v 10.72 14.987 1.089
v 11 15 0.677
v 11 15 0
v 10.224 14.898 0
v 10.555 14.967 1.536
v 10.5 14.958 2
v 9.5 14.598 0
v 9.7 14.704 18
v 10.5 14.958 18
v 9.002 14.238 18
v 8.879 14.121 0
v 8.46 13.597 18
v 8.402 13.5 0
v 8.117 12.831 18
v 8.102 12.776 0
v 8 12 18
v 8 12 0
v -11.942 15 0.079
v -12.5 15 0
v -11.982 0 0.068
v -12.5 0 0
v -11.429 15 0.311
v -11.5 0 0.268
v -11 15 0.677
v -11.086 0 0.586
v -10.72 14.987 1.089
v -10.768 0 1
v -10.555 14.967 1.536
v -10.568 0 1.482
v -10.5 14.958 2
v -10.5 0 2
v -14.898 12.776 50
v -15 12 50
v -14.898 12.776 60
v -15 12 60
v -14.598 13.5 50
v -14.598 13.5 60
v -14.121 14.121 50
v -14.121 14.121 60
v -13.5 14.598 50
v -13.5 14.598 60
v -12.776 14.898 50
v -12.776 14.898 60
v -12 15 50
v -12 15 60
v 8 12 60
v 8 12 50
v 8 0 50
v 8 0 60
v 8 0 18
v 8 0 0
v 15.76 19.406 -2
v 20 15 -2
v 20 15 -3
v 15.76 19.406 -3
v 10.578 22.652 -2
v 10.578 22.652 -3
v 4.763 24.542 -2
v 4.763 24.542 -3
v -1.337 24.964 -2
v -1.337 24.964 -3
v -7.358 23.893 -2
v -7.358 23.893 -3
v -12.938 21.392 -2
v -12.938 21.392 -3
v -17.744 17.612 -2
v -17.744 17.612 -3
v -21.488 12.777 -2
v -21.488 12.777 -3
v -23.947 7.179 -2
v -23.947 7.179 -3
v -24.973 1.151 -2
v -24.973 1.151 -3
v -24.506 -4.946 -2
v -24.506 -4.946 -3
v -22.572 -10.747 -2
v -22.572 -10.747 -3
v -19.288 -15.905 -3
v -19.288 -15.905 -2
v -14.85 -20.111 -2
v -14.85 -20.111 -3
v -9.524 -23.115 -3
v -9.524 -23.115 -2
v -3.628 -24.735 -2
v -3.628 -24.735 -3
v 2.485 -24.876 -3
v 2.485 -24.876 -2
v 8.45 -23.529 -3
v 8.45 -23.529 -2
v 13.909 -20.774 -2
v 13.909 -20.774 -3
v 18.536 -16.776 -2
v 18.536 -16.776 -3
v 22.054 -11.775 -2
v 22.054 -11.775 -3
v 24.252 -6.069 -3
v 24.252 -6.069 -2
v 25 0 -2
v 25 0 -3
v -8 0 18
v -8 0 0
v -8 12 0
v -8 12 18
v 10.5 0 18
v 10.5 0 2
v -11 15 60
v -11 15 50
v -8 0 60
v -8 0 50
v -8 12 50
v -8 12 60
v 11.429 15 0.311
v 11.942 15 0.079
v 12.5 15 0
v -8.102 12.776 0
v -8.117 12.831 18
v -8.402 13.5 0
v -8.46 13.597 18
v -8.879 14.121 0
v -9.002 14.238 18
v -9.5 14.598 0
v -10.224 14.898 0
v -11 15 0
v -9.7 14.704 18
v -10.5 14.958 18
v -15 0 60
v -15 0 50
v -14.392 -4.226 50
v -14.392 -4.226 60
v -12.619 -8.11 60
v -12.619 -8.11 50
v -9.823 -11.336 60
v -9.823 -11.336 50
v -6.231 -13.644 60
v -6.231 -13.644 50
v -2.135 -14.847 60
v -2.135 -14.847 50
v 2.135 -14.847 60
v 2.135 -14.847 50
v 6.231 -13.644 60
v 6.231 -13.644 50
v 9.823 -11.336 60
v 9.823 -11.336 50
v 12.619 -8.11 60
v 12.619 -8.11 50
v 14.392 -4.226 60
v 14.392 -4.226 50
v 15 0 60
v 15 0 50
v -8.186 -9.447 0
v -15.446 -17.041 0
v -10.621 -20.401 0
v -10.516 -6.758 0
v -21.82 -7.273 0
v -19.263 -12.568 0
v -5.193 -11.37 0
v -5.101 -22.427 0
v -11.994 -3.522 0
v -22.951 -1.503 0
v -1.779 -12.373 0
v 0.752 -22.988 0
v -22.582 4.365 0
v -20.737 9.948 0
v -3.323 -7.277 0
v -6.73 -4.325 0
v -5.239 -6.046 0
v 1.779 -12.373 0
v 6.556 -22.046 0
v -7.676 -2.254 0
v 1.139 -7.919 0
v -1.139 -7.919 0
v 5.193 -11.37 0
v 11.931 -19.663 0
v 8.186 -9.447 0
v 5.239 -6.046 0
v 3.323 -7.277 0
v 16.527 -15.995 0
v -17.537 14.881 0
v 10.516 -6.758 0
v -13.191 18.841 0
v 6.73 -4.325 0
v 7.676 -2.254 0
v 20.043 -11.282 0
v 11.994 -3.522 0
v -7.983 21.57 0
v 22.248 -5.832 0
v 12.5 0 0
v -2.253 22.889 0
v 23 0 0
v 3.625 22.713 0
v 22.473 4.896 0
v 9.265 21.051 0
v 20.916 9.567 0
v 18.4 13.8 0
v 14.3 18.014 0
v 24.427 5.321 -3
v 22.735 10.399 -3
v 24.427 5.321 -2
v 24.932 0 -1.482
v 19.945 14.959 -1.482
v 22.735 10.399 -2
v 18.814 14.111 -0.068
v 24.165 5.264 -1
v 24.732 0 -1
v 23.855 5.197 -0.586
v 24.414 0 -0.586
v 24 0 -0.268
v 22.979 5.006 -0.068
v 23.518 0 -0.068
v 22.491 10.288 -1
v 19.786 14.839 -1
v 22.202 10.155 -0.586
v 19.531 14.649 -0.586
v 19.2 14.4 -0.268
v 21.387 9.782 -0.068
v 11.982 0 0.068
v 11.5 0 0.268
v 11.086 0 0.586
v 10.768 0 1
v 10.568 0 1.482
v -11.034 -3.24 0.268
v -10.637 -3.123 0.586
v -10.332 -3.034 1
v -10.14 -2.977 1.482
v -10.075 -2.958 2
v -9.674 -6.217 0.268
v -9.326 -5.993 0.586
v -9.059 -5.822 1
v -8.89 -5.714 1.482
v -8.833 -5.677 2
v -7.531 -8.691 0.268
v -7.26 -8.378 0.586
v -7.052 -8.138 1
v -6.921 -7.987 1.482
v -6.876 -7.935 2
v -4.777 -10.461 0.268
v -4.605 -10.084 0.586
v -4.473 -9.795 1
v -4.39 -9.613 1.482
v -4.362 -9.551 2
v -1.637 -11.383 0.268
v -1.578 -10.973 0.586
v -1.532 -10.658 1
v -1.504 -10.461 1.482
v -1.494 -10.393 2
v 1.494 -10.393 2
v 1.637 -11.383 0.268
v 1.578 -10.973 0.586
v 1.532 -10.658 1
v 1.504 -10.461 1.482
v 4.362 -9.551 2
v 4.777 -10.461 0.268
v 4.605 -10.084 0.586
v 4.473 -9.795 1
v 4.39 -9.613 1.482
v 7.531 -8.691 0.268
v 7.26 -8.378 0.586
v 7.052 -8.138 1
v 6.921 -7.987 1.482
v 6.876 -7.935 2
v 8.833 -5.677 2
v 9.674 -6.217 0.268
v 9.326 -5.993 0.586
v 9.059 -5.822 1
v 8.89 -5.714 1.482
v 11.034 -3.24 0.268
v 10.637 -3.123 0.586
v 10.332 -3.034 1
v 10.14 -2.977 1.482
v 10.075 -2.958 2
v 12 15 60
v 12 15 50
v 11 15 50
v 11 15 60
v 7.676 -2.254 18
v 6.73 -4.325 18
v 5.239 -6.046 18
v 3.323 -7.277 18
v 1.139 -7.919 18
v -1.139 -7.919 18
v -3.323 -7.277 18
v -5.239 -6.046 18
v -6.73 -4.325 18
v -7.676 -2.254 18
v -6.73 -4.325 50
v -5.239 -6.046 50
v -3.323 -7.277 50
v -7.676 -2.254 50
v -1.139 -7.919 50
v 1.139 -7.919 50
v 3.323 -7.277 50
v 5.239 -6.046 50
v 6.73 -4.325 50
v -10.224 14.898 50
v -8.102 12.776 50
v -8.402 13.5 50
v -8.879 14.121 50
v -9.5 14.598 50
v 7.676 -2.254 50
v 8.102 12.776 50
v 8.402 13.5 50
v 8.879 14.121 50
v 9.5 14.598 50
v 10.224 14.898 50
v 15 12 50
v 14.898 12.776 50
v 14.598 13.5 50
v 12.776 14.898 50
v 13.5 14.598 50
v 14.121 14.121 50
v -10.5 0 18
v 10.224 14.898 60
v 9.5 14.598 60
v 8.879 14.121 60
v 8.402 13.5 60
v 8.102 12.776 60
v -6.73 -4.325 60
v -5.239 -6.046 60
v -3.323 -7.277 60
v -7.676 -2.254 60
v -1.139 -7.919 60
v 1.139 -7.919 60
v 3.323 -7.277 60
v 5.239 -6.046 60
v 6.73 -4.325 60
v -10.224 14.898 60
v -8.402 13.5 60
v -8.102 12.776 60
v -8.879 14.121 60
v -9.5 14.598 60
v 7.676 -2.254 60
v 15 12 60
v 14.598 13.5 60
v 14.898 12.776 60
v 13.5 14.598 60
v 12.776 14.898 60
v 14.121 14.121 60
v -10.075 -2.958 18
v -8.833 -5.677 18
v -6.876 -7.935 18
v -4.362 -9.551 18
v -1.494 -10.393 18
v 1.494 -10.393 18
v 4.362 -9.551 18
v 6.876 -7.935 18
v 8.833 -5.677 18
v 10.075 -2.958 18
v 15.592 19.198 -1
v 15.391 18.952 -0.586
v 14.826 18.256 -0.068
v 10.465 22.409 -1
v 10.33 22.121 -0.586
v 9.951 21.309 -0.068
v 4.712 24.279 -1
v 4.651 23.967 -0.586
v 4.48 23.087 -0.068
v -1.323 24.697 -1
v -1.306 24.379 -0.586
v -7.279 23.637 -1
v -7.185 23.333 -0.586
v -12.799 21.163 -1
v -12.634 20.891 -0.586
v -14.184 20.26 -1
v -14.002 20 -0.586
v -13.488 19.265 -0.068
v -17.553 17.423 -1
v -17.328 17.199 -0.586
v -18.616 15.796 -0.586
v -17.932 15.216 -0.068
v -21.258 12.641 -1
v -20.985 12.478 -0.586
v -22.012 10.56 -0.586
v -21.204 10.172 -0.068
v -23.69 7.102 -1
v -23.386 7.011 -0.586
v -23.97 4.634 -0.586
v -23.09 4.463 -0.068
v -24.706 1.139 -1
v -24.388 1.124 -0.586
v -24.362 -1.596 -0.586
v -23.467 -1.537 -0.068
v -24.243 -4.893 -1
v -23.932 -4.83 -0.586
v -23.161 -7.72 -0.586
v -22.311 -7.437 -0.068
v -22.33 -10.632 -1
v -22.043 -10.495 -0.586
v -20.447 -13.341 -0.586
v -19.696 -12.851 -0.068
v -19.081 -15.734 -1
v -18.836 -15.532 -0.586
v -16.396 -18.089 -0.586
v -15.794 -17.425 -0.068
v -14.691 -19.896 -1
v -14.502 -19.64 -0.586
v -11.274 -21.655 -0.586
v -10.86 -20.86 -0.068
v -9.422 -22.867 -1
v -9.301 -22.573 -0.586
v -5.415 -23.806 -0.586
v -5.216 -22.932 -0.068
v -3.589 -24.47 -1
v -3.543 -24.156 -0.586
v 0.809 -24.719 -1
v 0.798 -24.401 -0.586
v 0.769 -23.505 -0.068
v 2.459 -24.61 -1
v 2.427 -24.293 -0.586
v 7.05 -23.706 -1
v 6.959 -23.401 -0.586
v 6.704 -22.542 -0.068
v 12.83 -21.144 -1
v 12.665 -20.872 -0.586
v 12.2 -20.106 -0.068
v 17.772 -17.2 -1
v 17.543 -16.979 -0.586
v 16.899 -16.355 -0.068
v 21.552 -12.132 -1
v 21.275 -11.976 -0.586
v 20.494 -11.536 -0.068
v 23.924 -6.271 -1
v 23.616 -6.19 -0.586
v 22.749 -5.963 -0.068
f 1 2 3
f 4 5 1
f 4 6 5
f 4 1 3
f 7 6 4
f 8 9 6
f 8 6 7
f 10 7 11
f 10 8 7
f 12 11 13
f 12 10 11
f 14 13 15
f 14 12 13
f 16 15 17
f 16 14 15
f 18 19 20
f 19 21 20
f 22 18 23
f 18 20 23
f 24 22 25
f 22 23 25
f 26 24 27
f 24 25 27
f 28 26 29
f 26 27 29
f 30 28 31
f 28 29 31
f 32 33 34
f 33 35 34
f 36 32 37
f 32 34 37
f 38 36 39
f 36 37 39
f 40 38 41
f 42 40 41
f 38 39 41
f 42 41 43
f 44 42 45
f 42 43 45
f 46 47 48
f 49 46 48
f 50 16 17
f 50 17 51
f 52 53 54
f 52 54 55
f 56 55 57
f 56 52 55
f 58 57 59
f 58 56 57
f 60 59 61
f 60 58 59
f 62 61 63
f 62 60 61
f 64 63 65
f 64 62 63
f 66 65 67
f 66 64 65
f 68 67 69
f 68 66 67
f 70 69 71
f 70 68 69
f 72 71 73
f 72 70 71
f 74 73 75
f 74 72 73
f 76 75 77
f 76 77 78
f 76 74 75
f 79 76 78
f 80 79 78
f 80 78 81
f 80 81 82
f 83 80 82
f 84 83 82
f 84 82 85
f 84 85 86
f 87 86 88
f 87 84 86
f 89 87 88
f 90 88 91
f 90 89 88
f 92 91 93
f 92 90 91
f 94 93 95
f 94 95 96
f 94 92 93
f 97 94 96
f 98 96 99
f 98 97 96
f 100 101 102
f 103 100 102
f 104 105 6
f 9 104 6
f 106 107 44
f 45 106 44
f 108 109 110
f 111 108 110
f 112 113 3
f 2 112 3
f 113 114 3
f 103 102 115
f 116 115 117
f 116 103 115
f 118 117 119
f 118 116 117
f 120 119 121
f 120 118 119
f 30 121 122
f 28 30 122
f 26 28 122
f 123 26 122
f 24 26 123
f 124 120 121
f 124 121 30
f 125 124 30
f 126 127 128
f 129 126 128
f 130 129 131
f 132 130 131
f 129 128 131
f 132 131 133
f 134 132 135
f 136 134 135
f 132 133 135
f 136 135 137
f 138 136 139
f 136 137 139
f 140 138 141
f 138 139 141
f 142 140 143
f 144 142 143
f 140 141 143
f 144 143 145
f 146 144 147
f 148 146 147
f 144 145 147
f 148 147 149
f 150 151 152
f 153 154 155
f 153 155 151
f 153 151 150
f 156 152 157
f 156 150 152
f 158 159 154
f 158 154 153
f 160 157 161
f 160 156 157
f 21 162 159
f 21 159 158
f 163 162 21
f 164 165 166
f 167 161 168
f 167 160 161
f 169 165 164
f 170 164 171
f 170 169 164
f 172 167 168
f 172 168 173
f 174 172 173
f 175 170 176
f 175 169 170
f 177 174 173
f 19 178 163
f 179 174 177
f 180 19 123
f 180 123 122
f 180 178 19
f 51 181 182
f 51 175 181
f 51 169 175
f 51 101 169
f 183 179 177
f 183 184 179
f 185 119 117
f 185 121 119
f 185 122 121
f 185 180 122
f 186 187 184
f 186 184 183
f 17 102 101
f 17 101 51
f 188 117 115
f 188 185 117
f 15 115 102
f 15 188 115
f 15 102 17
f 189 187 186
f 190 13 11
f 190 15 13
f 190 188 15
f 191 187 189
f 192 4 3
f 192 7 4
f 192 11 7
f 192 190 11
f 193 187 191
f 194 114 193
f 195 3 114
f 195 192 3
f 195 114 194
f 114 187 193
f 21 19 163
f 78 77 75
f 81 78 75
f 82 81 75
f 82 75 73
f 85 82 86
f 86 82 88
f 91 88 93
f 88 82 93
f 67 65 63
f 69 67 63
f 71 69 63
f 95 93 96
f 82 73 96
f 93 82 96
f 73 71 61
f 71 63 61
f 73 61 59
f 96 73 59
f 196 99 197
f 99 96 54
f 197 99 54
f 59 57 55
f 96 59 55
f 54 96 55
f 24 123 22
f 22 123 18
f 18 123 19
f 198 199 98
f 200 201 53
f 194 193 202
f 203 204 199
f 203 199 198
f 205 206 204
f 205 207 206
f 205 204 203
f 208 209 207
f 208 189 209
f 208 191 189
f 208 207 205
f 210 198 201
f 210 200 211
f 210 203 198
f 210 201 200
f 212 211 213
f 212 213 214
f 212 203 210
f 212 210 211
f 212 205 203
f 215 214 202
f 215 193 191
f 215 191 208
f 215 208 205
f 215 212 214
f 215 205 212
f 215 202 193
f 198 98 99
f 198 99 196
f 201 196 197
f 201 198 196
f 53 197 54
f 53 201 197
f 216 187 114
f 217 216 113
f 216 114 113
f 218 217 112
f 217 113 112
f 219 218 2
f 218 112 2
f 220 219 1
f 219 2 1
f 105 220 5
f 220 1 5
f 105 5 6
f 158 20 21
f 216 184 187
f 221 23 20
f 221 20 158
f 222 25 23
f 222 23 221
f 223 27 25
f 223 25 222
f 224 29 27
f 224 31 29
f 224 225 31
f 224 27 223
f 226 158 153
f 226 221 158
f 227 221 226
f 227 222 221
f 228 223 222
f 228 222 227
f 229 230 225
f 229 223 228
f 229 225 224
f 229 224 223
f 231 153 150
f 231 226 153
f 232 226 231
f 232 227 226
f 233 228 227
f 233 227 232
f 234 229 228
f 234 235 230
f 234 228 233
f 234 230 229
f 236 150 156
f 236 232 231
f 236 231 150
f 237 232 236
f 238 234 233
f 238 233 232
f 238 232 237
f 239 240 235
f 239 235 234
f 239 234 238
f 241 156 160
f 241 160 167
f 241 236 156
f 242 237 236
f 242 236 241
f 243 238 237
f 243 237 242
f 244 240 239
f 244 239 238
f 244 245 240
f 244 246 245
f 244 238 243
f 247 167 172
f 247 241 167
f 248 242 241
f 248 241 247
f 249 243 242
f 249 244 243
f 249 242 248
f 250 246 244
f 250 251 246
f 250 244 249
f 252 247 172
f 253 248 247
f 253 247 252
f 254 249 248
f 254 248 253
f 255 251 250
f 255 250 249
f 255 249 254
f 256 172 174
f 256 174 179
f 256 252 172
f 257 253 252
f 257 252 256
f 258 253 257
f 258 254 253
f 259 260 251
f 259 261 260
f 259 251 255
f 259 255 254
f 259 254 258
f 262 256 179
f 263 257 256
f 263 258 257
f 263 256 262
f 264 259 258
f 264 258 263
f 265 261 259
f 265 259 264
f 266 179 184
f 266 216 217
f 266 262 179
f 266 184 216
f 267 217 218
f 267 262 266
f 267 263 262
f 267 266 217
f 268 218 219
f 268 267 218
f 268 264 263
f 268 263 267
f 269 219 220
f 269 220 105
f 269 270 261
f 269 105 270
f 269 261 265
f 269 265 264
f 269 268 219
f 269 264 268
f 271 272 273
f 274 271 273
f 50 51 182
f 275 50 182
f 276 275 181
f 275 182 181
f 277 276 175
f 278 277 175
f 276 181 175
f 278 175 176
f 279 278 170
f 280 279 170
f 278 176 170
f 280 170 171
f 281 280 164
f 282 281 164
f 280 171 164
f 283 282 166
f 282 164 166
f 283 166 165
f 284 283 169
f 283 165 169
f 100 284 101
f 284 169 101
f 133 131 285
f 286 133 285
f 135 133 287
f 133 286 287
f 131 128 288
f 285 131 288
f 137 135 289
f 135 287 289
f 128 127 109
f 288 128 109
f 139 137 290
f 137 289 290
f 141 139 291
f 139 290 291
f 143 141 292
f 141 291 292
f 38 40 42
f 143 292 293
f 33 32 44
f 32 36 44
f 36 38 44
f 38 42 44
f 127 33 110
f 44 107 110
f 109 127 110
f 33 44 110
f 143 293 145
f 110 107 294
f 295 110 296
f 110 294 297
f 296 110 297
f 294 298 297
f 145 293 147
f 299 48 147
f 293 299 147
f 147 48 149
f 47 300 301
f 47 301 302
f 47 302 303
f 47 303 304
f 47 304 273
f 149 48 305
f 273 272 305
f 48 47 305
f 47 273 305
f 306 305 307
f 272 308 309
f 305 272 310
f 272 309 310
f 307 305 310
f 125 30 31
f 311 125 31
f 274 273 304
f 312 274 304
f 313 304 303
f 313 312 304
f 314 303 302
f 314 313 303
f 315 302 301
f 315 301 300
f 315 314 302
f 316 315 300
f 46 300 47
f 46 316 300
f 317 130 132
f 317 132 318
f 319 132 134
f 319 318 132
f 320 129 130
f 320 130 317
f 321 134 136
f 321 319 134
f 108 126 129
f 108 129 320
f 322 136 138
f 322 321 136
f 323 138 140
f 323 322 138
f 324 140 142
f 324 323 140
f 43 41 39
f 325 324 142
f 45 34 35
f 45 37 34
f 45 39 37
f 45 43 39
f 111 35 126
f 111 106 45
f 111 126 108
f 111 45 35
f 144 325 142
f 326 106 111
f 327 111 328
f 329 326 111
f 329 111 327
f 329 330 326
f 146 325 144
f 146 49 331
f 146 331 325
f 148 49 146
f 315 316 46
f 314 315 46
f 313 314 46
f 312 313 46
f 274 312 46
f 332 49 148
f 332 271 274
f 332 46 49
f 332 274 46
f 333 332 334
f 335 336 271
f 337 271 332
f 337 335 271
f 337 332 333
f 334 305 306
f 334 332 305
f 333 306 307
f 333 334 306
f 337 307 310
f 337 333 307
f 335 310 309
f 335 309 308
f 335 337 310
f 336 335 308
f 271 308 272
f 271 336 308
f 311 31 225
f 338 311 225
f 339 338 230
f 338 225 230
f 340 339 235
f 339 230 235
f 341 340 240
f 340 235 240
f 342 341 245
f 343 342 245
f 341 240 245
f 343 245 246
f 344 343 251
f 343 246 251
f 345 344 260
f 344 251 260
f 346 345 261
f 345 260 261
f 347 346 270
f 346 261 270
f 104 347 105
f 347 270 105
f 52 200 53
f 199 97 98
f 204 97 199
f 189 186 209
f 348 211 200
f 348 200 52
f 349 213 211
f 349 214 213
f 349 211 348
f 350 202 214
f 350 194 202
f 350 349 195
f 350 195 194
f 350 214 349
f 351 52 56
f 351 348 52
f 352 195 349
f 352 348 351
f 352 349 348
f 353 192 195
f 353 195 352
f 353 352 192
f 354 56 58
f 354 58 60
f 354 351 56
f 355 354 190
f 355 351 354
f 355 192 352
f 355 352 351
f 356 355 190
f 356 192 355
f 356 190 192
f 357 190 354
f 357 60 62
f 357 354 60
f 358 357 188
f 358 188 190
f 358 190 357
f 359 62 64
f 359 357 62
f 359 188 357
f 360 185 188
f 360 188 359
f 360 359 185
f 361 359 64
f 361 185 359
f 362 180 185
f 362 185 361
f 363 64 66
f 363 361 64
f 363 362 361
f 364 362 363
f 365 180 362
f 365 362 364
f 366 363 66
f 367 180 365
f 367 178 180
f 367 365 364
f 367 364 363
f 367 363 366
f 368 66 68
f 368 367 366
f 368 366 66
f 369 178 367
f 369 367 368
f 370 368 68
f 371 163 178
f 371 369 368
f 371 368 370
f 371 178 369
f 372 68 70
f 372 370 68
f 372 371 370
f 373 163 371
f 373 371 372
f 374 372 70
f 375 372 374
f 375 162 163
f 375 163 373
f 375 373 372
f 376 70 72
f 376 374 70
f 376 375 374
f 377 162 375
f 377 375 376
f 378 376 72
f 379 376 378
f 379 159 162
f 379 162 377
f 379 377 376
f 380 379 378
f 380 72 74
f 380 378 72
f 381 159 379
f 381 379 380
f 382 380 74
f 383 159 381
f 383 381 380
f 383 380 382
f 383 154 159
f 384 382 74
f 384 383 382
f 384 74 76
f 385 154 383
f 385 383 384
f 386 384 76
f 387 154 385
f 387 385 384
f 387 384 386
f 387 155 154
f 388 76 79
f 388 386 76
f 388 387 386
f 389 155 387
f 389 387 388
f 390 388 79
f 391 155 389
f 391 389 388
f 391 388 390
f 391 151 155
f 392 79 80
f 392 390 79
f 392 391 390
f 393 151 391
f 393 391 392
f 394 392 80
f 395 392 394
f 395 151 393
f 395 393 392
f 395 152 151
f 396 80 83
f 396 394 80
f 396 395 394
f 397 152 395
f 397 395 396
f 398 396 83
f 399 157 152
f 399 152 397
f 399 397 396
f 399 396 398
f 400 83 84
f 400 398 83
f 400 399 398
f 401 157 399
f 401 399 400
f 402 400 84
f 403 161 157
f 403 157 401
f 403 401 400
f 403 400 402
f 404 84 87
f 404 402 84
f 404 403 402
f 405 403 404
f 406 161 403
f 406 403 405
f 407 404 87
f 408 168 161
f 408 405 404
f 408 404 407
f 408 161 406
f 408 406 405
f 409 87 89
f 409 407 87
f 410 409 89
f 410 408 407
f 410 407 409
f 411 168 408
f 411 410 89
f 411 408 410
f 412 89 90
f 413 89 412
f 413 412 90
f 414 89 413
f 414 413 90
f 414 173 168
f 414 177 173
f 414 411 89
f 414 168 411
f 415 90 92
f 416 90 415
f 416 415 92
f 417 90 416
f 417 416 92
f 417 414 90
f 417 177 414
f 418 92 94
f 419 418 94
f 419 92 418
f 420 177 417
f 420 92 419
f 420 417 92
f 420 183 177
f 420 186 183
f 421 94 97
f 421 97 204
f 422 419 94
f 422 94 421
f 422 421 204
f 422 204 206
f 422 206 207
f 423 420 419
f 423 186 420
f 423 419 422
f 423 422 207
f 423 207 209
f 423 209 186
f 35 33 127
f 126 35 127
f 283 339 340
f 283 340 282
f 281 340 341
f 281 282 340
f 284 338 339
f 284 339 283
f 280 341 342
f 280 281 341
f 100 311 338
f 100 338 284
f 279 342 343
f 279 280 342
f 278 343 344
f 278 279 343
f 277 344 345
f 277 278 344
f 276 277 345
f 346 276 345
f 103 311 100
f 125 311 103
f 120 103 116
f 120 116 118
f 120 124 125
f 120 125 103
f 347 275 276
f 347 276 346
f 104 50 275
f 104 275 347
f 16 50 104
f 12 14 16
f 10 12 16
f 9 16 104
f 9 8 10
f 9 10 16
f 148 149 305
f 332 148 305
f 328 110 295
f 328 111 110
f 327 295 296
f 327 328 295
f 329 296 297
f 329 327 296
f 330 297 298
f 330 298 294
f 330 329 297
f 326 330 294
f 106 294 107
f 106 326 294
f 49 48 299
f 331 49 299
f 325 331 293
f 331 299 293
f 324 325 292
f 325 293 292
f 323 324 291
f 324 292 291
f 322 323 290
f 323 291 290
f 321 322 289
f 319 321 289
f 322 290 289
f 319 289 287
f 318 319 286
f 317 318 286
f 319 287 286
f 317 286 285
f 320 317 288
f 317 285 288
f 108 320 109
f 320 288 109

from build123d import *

# Parameters (mm, degrees)
F1_DEPTH = 3
F2_DEPTH = 18
F3_R     = 2
F4_R     = 3
F7_DEPTH = 10
F8_R     = 3


with BuildPart() as f1:
    # F0 (on Top) → F1 (new body)
    with BuildSketch(Plane.XY):
        with BuildLine():
            ThreePointArc((-20, 15), (-7.9056941504, -23.7170824513), (25, 0))
            ThreePointArc((25, 0), (23.7170824513, 7.9056941504), (20, 15))
            Line((20, 15), (10.5, 15))
            Line((10.5, 15), (10.5, 0))
            ThreePointArc((10.5, 0), (0, -10.5), (-10.5, 0))
            Line((-10.5, 0), (-10.5, 15))
            Line((-10.5, 15), (-20, 15))
        make_face()
        with BuildLine():
            Line((10.5, 15), (20, 15))
            ThreePointArc((20, 15), (0, 25), (-20, 15))
            Line((-20, 15), (-10.5, 15))
            Line((-10.5, 15), (-8, 15))
            Line((-8, 15), (8, 15))
            Line((8, 15), (10.5, 15))
        make_face()
        with BuildLine():
            ThreePointArc((-8, 0), (0, -8), (8, 0))
            ThreePointArc((8, 0), (0, 8), (-8, 0))
        make_face()
        with BuildLine():
            Line((8, 0), (8, 6.8007352544))
            ThreePointArc((8, 6.8007352544), (0, 10.5), (-8, 6.8007352544))
            Line((-8, 6.8007352544), (-8, 0))
            ThreePointArc((-8, 0), (0, 8), (8, 0))
        make_face()
        with BuildLine():
            ThreePointArc((-10.5, 0), (0, -10.5), (10.5, 0))
            ThreePointArc((10.5, 0), (9.8552016722, 3.6228441865), (8, 6.8007352544))
            Line((8, 6.8007352544), (8, 0))
            ThreePointArc((8, 0), (0, -8), (-8, 0))
            Line((-8, 0), (-8, 6.8007352544))
            ThreePointArc((-8, 6.8007352544), (-9.8552016722, 3.6228441865), (-10.5, 0))
        make_face()
        with BuildLine():
            Line((-8, 15), (-10.5, 15))
            Line((-10.5, 15), (-10.5, 0))
            ThreePointArc((-10.5, 0), (-9.8552016722, 3.6228441865), (-8, 6.8007352544))
            Line((-8, 6.8007352544), (-8, 15))
        make_face()
        with BuildLine():
            Line((8, 6.8007352544), (8, 15))
            Line((8, 15), (-8, 15))
            Line((-8, 15), (-8, 6.8007352544))
            ThreePointArc((-8, 6.8007352544), (0, 10.5), (8, 6.8007352544))
        make_face()
        with BuildLine():
            Line((10.5, 0), (10.5, 15))
            Line((10.5, 15), (8, 15))
            Line((8, 15), (8, 6.8007352544))
            ThreePointArc((8, 6.8007352544), (9.8552016722, 3.6228441865), (10.5, 0))
        make_face()
    extrude(amount=-F1_DEPTH)

    # F0 (on Top) → F2 (join)
    with BuildSketch(Plane.XY):
        with BuildLine():
            Line((10.5, 0), (10.5, 15))
            Line((10.5, 15), (8, 15))
            Line((8, 15), (8, 6.8007352544))
            ThreePointArc((8, 6.8007352544), (9.8552016722, 3.6228441865), (10.5, 0))
        make_face()
        with BuildLine():
            ThreePointArc((-10.5, 0), (0, -10.5), (10.5, 0))
            ThreePointArc((10.5, 0), (9.8552016722, 3.6228441865), (8, 6.8007352544))
            Line((8, 6.8007352544), (8, 0))
            ThreePointArc((8, 0), (0, -8), (-8, 0))
            Line((-8, 0), (-8, 6.8007352544))
            ThreePointArc((-8, 6.8007352544), (-9.8552016722, 3.6228441865), (-10.5, 0))
        make_face()
        with BuildLine():
            Line((-8, 15), (-10.5, 15))
            Line((-10.5, 15), (-10.5, 0))
            ThreePointArc((-10.5, 0), (-9.8552016722, 3.6228441865), (-8, 6.8007352544))
            Line((-8, 6.8007352544), (-8, 15))
        make_face()
    extrude(amount=F2_DEPTH)

    # F3
    f3_edges = [f1.edges().sort_by_distance(p)[0] for p in [
        (-25, 0, 0),
        (0, -10.5, 0),
        (10.5, 7.5, 0),
        (-10.5, 7.5, 0),
    ]]
    fillet(f3_edges, radius=F3_R)

    # F4
    f4_edges = [f1.edges().sort_by_distance(p)[0] for p in [
        (-8, 15, 9),
        (8, 15, 9),
    ]]
    fillet(f4_edges, radius=F4_R)


with BuildPart() as f7:
    # F6 (on offset) → F7 (new body)
    with BuildSketch(Plane.XY.offset(50)):
        with BuildLine():
            Line((-15, 15), (-15, 0))
            ThreePointArc((-15, 0), (-13.1339255366, 7.2456883731), (-8, 12.6885775404))
            Line((-8, 12.6885775404), (-8, 15))
            Line((-8, 15), (-15, 15))
        make_face()
        with BuildLine():
            ThreePointArc((-8, 12.6885775404), (-13.1339255366, 7.2456883731), (-15, 0))
            ThreePointArc((-15, 0), (0, -15), (15, 0))
            ThreePointArc((15, 0), (13.1339255366, 7.2456883731), (8, 12.6885775404))
            Line((8, 12.6885775404), (8, 0))
            ThreePointArc((8, 0), (0, -8), (-8, 0))
            Line((-8, 0), (-8, 12.6885775404))
        make_face()
        with BuildLine():
            ThreePointArc((8, 12.6885775404), (13.1339255366, 7.2456883731), (15, 0))
            Line((15, 0), (15, 15))
            Line((15, 15), (8, 15))
            Line((8, 15), (8, 12.6885775404))
        make_face()
    extrude(amount=F7_DEPTH)

    # F8
    f8_edges = [f7.edges().sort_by_distance(p)[0] for p in [
        (-8, 15, 55),
        (8, 15, 55),
        (-15, 15, 55),
        (15, 15, 55),
    ]]
    fillet(f8_edges, radius=F8_R)


solid = Compound([f1.part, f7.part])
